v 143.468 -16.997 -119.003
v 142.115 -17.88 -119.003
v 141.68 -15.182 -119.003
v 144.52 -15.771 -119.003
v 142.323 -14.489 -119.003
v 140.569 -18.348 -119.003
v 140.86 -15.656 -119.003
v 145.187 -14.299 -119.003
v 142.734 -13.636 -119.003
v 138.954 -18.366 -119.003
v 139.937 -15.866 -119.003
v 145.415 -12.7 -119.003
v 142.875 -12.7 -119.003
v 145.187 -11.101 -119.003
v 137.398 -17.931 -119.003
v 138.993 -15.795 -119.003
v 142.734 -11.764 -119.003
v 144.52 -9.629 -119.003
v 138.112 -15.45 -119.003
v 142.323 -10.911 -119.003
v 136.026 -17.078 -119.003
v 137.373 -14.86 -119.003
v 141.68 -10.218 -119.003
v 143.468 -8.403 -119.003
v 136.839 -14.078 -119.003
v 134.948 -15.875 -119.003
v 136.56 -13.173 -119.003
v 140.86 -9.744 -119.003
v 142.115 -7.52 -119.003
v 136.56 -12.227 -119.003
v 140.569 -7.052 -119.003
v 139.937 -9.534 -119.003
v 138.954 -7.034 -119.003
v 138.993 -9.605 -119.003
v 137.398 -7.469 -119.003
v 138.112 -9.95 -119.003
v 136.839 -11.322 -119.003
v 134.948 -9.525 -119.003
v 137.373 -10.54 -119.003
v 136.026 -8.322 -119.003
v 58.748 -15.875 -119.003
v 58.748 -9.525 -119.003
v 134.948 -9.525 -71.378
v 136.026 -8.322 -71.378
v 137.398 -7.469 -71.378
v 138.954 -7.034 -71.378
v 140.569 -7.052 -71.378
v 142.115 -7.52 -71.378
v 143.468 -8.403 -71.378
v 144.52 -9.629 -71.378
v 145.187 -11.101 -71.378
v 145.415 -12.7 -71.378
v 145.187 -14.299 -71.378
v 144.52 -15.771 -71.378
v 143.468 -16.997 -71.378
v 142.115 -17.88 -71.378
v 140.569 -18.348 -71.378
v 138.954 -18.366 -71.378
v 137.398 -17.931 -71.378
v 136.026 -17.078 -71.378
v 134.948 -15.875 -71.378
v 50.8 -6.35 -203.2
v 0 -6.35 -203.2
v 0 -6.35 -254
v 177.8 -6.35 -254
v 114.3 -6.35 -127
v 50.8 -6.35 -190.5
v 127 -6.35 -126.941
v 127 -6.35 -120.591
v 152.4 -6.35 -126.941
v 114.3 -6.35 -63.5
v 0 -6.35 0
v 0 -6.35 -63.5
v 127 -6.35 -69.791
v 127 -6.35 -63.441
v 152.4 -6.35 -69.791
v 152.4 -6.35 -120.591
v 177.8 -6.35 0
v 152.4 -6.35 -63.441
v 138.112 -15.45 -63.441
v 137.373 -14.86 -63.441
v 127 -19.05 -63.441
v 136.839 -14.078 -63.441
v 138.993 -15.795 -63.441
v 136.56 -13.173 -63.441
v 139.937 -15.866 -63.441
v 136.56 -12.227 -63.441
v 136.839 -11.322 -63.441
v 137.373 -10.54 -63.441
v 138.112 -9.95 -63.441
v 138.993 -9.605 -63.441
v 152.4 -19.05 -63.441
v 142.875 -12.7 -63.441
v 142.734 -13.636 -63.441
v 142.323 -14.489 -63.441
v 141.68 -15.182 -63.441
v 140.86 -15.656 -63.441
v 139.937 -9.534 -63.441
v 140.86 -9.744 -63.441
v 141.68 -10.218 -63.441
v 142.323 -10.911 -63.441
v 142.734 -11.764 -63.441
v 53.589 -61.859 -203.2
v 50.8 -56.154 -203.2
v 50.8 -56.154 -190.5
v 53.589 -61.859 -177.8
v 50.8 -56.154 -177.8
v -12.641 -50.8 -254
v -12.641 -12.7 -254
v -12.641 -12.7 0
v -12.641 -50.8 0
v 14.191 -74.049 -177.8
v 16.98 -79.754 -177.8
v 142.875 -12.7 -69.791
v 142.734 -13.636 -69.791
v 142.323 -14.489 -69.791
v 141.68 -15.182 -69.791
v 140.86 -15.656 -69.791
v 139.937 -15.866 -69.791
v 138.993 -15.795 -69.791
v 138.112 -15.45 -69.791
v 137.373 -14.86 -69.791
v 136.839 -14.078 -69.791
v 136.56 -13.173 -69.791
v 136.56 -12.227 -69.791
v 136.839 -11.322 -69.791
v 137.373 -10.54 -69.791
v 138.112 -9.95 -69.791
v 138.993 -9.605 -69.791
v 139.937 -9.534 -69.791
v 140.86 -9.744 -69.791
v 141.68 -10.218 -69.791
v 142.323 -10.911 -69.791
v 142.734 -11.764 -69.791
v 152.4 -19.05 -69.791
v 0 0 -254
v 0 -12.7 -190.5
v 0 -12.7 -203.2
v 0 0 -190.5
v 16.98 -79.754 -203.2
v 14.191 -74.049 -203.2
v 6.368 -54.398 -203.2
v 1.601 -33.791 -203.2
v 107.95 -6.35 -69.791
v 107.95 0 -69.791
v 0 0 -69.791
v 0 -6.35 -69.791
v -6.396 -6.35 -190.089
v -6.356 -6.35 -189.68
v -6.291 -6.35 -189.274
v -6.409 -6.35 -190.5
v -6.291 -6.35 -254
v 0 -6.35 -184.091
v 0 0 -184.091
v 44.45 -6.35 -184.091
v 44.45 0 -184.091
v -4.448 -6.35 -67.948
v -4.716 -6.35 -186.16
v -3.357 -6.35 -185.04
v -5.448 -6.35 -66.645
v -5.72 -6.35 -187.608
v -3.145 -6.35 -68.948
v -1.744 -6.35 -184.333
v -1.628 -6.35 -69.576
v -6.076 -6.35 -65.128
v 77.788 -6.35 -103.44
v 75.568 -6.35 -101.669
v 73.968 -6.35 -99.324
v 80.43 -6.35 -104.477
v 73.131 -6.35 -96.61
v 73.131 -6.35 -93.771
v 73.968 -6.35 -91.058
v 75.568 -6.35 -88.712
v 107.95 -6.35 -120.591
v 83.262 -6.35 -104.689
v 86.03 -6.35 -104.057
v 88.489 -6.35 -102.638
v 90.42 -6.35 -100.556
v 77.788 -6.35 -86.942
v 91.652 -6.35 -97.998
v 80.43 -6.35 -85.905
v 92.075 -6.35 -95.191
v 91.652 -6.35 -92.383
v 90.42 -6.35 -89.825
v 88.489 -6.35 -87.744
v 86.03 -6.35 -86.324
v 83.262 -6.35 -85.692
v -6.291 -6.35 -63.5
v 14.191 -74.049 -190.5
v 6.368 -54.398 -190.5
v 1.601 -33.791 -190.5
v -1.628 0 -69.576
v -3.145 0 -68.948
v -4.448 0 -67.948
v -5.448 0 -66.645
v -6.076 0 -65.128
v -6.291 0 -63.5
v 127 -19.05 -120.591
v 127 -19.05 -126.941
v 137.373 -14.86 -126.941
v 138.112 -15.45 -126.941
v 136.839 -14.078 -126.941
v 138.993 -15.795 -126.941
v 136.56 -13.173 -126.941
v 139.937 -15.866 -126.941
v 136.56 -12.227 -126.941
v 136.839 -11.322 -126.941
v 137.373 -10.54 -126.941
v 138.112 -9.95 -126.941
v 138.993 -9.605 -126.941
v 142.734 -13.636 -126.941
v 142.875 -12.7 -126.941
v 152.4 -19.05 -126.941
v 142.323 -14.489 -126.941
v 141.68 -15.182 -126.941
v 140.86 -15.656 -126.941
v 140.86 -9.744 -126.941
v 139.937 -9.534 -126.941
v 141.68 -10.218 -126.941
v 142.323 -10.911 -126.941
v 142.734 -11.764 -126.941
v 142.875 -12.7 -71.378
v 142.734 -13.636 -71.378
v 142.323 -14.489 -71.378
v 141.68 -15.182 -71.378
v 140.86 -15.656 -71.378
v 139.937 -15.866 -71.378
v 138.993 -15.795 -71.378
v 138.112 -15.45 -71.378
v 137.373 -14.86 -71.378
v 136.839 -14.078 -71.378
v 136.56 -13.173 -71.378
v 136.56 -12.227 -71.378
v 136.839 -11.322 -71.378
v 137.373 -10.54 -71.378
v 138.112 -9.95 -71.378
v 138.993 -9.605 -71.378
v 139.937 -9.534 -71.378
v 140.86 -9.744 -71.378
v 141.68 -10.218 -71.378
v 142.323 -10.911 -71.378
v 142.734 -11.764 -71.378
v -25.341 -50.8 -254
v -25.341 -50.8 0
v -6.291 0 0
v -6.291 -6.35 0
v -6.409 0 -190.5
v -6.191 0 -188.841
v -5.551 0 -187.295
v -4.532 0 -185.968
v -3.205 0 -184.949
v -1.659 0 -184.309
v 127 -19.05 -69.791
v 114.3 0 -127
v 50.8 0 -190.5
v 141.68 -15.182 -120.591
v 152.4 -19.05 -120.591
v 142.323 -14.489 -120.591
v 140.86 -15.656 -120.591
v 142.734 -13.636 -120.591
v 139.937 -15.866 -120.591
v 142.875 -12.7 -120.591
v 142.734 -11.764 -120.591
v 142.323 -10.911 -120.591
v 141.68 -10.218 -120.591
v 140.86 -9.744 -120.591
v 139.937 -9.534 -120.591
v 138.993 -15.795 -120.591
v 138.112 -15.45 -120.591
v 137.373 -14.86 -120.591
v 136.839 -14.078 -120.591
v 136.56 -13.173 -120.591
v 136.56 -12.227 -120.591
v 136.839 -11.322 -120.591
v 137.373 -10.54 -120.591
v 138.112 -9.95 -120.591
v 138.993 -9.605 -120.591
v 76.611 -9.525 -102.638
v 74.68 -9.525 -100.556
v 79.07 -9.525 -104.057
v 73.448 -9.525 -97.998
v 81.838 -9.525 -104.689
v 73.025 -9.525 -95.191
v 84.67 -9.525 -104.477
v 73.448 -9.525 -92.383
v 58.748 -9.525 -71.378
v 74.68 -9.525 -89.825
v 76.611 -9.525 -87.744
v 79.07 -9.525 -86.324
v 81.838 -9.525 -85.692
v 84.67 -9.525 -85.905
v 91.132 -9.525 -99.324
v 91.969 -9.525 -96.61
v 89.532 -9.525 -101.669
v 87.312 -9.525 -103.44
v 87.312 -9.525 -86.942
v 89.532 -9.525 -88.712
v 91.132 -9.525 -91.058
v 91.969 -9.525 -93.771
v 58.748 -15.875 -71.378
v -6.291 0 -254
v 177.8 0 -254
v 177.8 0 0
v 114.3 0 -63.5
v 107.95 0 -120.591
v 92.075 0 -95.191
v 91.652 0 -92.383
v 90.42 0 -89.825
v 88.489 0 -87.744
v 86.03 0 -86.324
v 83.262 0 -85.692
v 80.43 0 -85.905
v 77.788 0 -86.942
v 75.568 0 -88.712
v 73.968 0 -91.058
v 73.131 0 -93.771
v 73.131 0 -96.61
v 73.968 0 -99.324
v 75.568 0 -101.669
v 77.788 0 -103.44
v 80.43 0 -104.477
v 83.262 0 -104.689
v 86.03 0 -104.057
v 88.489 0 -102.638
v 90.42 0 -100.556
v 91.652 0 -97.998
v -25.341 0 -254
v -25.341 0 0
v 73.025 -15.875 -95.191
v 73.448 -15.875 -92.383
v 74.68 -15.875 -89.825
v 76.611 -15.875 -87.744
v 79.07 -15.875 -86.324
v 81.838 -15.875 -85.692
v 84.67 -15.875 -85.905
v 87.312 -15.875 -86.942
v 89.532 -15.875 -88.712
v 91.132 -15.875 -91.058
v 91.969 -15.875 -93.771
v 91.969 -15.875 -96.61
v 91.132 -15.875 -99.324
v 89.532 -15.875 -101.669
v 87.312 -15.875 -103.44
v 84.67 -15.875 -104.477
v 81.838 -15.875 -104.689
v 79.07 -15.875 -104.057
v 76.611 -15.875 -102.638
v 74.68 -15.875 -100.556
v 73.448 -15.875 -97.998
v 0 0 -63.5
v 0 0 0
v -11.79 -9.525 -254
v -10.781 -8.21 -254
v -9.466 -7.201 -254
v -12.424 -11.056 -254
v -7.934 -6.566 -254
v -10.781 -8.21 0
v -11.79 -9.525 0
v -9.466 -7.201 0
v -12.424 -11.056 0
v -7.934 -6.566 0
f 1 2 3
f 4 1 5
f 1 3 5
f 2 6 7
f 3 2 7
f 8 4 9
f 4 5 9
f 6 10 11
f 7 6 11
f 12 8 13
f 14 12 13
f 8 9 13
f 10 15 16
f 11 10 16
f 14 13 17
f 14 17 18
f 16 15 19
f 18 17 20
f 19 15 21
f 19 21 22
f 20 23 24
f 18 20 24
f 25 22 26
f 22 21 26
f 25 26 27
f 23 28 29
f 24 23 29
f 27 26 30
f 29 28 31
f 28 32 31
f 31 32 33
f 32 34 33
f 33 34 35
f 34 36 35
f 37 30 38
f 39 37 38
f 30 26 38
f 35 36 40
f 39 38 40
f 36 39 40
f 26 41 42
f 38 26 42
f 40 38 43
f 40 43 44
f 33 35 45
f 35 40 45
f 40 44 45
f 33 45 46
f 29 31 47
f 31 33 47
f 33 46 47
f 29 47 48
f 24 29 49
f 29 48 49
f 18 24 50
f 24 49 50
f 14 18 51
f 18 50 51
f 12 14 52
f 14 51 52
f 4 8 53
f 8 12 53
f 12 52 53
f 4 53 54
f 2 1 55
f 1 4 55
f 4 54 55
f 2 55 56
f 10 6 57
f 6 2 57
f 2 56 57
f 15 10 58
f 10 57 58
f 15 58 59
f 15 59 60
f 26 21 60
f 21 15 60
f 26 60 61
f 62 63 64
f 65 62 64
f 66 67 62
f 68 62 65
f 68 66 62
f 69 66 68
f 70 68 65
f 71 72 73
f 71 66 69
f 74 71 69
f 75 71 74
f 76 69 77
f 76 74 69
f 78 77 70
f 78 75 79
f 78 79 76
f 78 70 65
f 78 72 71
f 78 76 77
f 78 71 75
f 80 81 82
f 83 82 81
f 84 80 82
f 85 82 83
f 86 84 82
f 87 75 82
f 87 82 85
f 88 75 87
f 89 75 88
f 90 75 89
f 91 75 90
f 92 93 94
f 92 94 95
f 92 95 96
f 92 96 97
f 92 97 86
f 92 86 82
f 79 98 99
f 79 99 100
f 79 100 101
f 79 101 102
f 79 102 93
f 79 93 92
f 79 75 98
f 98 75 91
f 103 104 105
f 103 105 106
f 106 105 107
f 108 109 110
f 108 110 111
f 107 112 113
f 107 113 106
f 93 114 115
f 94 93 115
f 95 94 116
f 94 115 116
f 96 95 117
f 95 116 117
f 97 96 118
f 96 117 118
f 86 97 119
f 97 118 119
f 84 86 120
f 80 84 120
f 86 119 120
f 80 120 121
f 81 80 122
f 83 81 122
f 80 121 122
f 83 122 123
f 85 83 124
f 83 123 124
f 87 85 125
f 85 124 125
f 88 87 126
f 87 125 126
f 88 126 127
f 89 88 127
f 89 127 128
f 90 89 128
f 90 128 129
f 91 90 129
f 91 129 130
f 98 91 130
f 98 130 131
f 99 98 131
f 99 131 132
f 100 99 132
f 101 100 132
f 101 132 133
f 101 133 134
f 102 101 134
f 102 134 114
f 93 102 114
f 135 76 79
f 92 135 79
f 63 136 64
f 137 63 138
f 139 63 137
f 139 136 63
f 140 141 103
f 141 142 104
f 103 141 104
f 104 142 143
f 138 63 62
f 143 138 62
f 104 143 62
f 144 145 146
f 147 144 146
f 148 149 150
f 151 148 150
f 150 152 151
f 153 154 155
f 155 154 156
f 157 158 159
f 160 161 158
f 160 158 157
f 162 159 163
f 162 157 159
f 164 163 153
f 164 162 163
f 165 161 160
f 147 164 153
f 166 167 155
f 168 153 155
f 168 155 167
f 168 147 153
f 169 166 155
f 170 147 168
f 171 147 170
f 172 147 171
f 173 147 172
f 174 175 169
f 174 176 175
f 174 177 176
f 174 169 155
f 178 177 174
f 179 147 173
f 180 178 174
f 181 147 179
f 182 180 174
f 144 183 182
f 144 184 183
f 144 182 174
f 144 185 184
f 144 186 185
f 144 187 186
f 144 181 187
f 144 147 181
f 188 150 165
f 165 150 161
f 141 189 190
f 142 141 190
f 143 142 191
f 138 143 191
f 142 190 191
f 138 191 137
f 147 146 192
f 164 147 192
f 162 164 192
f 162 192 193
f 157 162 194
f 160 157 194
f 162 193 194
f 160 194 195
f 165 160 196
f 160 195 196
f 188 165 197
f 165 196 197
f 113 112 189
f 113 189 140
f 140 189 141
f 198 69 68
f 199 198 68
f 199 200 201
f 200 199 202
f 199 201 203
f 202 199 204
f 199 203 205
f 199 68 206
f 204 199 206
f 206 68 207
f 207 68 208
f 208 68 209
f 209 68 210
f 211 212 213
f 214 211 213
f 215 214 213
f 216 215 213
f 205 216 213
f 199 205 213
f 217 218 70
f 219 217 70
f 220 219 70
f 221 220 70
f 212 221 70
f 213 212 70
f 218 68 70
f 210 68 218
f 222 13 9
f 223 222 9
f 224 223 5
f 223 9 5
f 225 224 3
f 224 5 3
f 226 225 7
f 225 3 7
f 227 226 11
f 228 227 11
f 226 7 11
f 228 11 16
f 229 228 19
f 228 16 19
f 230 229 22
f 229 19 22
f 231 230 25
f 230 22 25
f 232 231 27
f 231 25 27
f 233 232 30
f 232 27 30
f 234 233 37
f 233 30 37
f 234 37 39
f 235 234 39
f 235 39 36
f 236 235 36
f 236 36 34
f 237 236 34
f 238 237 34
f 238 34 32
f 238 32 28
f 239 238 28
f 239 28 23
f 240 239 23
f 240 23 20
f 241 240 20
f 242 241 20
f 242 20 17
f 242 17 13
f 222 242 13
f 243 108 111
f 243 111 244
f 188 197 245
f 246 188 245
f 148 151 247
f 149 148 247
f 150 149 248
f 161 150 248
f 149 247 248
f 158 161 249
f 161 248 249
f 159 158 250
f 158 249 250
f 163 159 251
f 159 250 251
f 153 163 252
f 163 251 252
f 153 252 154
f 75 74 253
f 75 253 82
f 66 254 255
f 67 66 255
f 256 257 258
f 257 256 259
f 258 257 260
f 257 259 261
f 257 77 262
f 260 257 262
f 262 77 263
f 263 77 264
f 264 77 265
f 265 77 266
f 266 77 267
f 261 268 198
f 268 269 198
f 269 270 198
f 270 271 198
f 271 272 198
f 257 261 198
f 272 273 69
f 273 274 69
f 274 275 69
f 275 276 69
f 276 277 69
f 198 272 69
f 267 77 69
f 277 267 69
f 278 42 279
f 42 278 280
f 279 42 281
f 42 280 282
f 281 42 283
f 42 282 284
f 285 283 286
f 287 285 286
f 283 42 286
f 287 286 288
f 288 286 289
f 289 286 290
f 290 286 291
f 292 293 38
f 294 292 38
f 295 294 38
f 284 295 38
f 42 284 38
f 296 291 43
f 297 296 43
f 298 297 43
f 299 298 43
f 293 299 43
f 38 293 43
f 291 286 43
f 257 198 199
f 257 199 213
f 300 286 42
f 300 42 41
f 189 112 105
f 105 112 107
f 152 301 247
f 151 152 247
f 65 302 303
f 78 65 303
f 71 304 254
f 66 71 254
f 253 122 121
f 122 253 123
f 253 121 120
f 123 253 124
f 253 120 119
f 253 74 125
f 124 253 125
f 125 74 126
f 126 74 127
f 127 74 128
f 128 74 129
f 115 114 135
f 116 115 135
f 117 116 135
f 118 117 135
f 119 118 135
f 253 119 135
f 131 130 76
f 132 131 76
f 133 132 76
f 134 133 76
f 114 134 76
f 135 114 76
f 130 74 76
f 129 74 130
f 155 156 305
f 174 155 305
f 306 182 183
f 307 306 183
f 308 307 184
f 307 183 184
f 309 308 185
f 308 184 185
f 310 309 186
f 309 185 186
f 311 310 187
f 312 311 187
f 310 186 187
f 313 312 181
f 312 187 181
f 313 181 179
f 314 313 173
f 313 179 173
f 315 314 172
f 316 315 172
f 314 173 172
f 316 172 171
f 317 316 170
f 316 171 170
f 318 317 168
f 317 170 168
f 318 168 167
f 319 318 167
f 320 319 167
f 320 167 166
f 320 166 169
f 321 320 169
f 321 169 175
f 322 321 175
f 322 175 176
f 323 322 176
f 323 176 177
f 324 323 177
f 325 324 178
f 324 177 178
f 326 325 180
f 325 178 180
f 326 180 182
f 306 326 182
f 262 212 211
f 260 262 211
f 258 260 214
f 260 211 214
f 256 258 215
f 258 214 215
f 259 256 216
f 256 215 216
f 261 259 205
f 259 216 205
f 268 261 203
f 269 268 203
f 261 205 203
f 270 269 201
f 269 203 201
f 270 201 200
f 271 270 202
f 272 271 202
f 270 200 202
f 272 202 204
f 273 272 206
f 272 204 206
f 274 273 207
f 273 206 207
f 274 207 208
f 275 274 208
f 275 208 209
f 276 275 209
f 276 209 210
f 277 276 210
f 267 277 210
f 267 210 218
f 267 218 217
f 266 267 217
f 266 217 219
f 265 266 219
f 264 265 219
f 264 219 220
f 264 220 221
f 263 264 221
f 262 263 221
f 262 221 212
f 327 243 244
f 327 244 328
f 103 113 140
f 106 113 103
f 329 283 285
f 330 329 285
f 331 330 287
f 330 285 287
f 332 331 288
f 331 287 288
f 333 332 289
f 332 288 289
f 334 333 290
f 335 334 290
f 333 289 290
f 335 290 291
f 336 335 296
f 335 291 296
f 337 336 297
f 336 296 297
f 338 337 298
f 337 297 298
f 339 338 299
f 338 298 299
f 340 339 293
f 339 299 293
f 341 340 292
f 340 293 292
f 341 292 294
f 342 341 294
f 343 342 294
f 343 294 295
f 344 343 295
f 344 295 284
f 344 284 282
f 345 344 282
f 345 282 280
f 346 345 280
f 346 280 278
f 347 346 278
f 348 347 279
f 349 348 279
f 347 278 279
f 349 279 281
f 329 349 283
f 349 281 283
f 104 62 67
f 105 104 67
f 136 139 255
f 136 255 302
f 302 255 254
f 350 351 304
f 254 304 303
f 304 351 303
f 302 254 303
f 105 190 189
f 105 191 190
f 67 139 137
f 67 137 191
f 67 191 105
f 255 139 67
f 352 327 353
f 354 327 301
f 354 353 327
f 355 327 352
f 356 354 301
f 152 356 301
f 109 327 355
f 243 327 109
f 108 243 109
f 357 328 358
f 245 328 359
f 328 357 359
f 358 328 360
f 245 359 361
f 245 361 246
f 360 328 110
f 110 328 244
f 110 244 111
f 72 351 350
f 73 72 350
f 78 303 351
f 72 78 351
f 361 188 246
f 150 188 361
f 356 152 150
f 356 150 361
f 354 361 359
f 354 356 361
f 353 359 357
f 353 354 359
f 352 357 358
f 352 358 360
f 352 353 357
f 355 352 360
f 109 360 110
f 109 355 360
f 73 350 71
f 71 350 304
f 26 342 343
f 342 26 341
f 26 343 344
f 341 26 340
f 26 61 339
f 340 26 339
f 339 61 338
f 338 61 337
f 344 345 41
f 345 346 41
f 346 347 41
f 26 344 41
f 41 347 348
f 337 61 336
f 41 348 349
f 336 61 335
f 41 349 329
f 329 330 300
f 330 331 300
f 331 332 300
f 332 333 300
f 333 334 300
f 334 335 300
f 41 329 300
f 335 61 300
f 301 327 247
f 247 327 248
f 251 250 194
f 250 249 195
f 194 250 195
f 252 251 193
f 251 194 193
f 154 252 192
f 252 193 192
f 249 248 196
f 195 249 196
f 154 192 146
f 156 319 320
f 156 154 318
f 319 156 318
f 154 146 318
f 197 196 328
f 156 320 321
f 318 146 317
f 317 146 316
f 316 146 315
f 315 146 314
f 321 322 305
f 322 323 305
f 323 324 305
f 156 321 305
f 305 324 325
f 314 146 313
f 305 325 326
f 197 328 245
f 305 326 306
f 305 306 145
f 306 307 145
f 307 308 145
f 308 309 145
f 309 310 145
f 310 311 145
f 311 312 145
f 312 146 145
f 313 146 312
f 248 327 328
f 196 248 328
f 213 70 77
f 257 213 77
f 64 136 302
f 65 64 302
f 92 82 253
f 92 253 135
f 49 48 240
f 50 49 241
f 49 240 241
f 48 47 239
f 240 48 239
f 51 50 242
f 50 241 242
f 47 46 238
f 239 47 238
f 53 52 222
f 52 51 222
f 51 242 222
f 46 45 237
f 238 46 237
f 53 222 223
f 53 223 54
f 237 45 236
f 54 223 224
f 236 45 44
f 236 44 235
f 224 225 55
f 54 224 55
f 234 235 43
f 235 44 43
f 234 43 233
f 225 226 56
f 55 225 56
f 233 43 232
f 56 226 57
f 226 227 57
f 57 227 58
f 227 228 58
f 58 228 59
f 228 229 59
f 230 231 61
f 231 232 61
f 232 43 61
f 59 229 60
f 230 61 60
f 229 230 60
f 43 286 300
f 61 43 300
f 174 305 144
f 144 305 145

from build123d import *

# Parameters (mm, degrees)
F1_DEPTH      = 6.35
F3_DEPTH      = 6.35
F4_R          = 9.525
F5_DEPTH      = 6.35
F6_W          = 25.4
F6_H          = 6.35
F7_DEPTH      = 12.7
F8_R          = 3.175
F9_DEPTH      = 63.5
F9_DEPTH_BACK = 25.4
F10_R         = 3.175
F10_W         = 68.2519048813
F10_H         = 6.35
F11_DEPTH     = 50.8
F12_R         = 9.525
F13_DEPTH     = 6.35
F14_W         = 3.175
F14_H         = 1.5875
F14_W_2       = 6.35
F15_DEPTH     = 119.0529048813
F17_DEPTH     = 254
F18_W         = 50.8
F18_H         = 12.7
F19_DEPTH     = 69.85
F21_DEPTH     = 12.7
F22_W         = 40.7479911996
F22_H         = 12.7
F23_DEPTH     = 6.35


with BuildPart() as f1:
    # F0 (on Front) → F1 (new body)
    with BuildSketch(Plane.XZ):
        Polygon((177.8, 0), (0, 0), (0, -63.5), (114.3, -63.5), (114.3, -127), (50.8, -190.5), (0, -190.5), (0, -254), (177.8, -254), align=None)
    extrude(amount=F1_DEPTH)

    # F6 (on face) → F7 (join)
    with BuildSketch(Plane.XZ.offset(6.35)):
        with Locations((139.7, -66.6157917917)):
            Rectangle(F6_W, F6_H)
        Polygon((152.4, -120.5907917917), (139.7, -120.5907917917), (127, -120.5907917917), (127, -126.9407917917), (152.4, -126.9407917917), align=None)
    extrude(amount=F7_DEPTH)

    # F8 (on face) → F9 (cut, two sides)
    with BuildSketch(Plane(origin=(0, 0, -126.9407917917), x_dir=(1, 0, 0), z_dir=(0, 0, -1))) as f9_sk:
        with Locations((139.7, 12.7)):
            Circle(F8_R)
    extrude(amount=-F9_DEPTH, mode=Mode.SUBTRACT)
    extrude(f9_sk.sketch, amount=F9_DEPTH_BACK, mode=Mode.SUBTRACT)

    # F10 (on face) → F11 (join, through all)
    with BuildSketch(Plane(origin=(0, 0, -69.7907917917), x_dir=(1, 0, 0), z_dir=(0, 0, -1))):
        with BuildLine():
            ThreePointArc((134.9480951187, 9.525), (133.9849999999, 12.7), (134.9480951187, 15.875))
            Line((134.9480951187, 15.875), (127, 15.875))
            Line((127, 15.875), (127, 9.525))
            Line((127, 9.525), (134.9480951187, 9.525))
        make_face()
        with BuildLine():
            ThreePointArc((145.4149999999, 12.7), (141.3589286608, 18.1689286609), (134.9480951187, 15.875))
            ThreePointArc((134.9480951187, 15.875), (133.9849999999, 12.7), (134.9480951187, 9.525))
            ThreePointArc((134.9480951187, 9.525), (141.3589286608, 7.2310713391), (145.4149999999, 12.7))
        make_face()
        with Locations((139.6999999999, 12.7)):
            Circle(F10_R, mode=Mode.SUBTRACT)
        with Locations((92.8740475593, 12.7)):
            Rectangle(F10_W, F10_H)
    extrude(amount=F11_DEPTH)

    # F12 (on face) → F13 (cut, through all)
    with BuildSketch(Plane(origin=(0, -9.525, 0), x_dir=(-1, 0, 0), z_dir=(0, 1, 0))):
        with Locations((-82.5499999999, -95.1907917917)):
            Circle(F12_R)
    extrude(amount=-F13_DEPTH, mode=Mode.SUBTRACT)

    # F14 (on face) → F15 (cut, through all)
    with BuildSketch(Plane(origin=(58.7480951187, 0, 0), x_dir=(0, -1, 0), z_dir=(-1, 0, 0))):
        with Locations((17.4625, -119.7970417917)):
            Rectangle(F14_W, F14_H)
        with Locations((12.7, -119.7970417917)):
            Rectangle(F14_W_2, F14_H)
        with Locations((7.9375, -119.7970417917)):
            Rectangle(F14_W, F14_H)
        with Locations((7.9375, -70.5845417917)):
            Rectangle(F14_W, F14_H)
        with Locations((12.7, -70.5845417917)):
            Rectangle(F14_W_2, F14_H)
        with Locations((17.4625, -70.5845417917)):
            Rectangle(F14_W, F14_H)
    extrude(amount=-F15_DEPTH, mode=Mode.SUBTRACT)

    # F18 (on face) → F19 (join)
    with BuildSketch(Plane.XZ.offset(6.35)):
        with Locations((25.4, -196.85)):
            Rectangle(F18_W, F18_H)
    extrude(amount=F19_DEPTH)

    # F20 (on face) → F21 (cut, through all)
    with BuildSketch(Plane.XY.offset(-190.5)):
        with BuildLine():
            ThreePointArc((14.1913807151, -74.0488099738), (3.5940778032, -44.1844079339), (0, -12.7))
            Line((0, -12.7), (0, -76.2))
            Line((0, -76.2), (50.8, -76.2))
            Line((50.8, -76.2), (50.8, -56.1544594446))
            Line((50.8, -56.1544594446), (14.1913807151, -74.0488099738))
        make_face()
    extrude(amount=-F21_DEPTH, mode=Mode.SUBTRACT)

    # F22 (on face) → F23 (join)
    with BuildSketch(Plane(origin=(31.9517444991, -65.367516298, 0), x_dir=(0.8984153134, 0.4391468144, 0), z_dir=(0.4391468144, -0.8984153134, 0))):
        with Locations((0.6054503416, -184.15)):
            Rectangle(F22_W, F22_H)
        with Locations((0.6054503416, -196.85)):
            Rectangle(F22_W, F22_H)
    extrude(amount=F23_DEPTH)


with BuildPart() as f3:
    # F2 (on Front) → F3 (new body)
    with BuildSketch(Plane.XZ):
        with BuildLine():
            Line((107.95, -69.7907917917), (0, -69.7907917917))
            ThreePointArc((0, -69.7907917917), (-4.4482615349, -67.9482615349), (-6.2907917917, -63.5))
            Line((-6.2907917917, -63.5), (-6.2907917917, 0))
            Line((-6.2907917917, 0), (-25.3407917917, 0))
            Line((-25.3407917917, 0), (-25.3407917917, -254))
            Line((-25.3407917917, -254), (-6.2907917917, -254))
            Line((-6.2907917917, -254), (-6.4092082083, -190.5))
            ThreePointArc((-6.4092082083, -190.5), (-4.5319945861, -185.9680054139), (0, -184.0907917917))
            Line((0, -184.0907917917), (44.45, -184.0907917917))
            Line((44.45, -184.0907917917), (107.95, -120.5907917917))
            Line((107.95, -120.5907917917), (107.95, -69.7907917917))
        make_face()
    extrude(amount=F3_DEPTH)

    # F4 (on face) → F5 (cut, through all)
    with BuildSketch(Plane.XZ.offset(6.35)):
        with Locations((82.55, -95.1907917917)):
            Circle(F4_R)
    extrude(amount=-F5_DEPTH, mode=Mode.SUBTRACT)

    # F16 (on face) → F17 (join)
    with BuildSketch(Plane(origin=(0, 0, -254), x_dir=(1, 0, 0), z_dir=(0, 0, -1))):
        with BuildLine():
            Line((-25.3407917917, 50.8), (-25.3407917917, 6.35))
            Line((-25.3407917917, 6.35), (-6.2907917917, 6.35))
            ThreePointArc((-6.2907917917, 6.35), (-10.7809198522, 8.2098719395), (-12.6407917917, 12.7))
            Line((-12.6407917917, 12.7), (-12.6407917917, 50.8))
            Line((-12.6407917917, 50.8), (-25.3407917917, 50.8))
        make_face()
    extrude(amount=-F17_DEPTH)


solid = Compound([f1.part, f3.part])
